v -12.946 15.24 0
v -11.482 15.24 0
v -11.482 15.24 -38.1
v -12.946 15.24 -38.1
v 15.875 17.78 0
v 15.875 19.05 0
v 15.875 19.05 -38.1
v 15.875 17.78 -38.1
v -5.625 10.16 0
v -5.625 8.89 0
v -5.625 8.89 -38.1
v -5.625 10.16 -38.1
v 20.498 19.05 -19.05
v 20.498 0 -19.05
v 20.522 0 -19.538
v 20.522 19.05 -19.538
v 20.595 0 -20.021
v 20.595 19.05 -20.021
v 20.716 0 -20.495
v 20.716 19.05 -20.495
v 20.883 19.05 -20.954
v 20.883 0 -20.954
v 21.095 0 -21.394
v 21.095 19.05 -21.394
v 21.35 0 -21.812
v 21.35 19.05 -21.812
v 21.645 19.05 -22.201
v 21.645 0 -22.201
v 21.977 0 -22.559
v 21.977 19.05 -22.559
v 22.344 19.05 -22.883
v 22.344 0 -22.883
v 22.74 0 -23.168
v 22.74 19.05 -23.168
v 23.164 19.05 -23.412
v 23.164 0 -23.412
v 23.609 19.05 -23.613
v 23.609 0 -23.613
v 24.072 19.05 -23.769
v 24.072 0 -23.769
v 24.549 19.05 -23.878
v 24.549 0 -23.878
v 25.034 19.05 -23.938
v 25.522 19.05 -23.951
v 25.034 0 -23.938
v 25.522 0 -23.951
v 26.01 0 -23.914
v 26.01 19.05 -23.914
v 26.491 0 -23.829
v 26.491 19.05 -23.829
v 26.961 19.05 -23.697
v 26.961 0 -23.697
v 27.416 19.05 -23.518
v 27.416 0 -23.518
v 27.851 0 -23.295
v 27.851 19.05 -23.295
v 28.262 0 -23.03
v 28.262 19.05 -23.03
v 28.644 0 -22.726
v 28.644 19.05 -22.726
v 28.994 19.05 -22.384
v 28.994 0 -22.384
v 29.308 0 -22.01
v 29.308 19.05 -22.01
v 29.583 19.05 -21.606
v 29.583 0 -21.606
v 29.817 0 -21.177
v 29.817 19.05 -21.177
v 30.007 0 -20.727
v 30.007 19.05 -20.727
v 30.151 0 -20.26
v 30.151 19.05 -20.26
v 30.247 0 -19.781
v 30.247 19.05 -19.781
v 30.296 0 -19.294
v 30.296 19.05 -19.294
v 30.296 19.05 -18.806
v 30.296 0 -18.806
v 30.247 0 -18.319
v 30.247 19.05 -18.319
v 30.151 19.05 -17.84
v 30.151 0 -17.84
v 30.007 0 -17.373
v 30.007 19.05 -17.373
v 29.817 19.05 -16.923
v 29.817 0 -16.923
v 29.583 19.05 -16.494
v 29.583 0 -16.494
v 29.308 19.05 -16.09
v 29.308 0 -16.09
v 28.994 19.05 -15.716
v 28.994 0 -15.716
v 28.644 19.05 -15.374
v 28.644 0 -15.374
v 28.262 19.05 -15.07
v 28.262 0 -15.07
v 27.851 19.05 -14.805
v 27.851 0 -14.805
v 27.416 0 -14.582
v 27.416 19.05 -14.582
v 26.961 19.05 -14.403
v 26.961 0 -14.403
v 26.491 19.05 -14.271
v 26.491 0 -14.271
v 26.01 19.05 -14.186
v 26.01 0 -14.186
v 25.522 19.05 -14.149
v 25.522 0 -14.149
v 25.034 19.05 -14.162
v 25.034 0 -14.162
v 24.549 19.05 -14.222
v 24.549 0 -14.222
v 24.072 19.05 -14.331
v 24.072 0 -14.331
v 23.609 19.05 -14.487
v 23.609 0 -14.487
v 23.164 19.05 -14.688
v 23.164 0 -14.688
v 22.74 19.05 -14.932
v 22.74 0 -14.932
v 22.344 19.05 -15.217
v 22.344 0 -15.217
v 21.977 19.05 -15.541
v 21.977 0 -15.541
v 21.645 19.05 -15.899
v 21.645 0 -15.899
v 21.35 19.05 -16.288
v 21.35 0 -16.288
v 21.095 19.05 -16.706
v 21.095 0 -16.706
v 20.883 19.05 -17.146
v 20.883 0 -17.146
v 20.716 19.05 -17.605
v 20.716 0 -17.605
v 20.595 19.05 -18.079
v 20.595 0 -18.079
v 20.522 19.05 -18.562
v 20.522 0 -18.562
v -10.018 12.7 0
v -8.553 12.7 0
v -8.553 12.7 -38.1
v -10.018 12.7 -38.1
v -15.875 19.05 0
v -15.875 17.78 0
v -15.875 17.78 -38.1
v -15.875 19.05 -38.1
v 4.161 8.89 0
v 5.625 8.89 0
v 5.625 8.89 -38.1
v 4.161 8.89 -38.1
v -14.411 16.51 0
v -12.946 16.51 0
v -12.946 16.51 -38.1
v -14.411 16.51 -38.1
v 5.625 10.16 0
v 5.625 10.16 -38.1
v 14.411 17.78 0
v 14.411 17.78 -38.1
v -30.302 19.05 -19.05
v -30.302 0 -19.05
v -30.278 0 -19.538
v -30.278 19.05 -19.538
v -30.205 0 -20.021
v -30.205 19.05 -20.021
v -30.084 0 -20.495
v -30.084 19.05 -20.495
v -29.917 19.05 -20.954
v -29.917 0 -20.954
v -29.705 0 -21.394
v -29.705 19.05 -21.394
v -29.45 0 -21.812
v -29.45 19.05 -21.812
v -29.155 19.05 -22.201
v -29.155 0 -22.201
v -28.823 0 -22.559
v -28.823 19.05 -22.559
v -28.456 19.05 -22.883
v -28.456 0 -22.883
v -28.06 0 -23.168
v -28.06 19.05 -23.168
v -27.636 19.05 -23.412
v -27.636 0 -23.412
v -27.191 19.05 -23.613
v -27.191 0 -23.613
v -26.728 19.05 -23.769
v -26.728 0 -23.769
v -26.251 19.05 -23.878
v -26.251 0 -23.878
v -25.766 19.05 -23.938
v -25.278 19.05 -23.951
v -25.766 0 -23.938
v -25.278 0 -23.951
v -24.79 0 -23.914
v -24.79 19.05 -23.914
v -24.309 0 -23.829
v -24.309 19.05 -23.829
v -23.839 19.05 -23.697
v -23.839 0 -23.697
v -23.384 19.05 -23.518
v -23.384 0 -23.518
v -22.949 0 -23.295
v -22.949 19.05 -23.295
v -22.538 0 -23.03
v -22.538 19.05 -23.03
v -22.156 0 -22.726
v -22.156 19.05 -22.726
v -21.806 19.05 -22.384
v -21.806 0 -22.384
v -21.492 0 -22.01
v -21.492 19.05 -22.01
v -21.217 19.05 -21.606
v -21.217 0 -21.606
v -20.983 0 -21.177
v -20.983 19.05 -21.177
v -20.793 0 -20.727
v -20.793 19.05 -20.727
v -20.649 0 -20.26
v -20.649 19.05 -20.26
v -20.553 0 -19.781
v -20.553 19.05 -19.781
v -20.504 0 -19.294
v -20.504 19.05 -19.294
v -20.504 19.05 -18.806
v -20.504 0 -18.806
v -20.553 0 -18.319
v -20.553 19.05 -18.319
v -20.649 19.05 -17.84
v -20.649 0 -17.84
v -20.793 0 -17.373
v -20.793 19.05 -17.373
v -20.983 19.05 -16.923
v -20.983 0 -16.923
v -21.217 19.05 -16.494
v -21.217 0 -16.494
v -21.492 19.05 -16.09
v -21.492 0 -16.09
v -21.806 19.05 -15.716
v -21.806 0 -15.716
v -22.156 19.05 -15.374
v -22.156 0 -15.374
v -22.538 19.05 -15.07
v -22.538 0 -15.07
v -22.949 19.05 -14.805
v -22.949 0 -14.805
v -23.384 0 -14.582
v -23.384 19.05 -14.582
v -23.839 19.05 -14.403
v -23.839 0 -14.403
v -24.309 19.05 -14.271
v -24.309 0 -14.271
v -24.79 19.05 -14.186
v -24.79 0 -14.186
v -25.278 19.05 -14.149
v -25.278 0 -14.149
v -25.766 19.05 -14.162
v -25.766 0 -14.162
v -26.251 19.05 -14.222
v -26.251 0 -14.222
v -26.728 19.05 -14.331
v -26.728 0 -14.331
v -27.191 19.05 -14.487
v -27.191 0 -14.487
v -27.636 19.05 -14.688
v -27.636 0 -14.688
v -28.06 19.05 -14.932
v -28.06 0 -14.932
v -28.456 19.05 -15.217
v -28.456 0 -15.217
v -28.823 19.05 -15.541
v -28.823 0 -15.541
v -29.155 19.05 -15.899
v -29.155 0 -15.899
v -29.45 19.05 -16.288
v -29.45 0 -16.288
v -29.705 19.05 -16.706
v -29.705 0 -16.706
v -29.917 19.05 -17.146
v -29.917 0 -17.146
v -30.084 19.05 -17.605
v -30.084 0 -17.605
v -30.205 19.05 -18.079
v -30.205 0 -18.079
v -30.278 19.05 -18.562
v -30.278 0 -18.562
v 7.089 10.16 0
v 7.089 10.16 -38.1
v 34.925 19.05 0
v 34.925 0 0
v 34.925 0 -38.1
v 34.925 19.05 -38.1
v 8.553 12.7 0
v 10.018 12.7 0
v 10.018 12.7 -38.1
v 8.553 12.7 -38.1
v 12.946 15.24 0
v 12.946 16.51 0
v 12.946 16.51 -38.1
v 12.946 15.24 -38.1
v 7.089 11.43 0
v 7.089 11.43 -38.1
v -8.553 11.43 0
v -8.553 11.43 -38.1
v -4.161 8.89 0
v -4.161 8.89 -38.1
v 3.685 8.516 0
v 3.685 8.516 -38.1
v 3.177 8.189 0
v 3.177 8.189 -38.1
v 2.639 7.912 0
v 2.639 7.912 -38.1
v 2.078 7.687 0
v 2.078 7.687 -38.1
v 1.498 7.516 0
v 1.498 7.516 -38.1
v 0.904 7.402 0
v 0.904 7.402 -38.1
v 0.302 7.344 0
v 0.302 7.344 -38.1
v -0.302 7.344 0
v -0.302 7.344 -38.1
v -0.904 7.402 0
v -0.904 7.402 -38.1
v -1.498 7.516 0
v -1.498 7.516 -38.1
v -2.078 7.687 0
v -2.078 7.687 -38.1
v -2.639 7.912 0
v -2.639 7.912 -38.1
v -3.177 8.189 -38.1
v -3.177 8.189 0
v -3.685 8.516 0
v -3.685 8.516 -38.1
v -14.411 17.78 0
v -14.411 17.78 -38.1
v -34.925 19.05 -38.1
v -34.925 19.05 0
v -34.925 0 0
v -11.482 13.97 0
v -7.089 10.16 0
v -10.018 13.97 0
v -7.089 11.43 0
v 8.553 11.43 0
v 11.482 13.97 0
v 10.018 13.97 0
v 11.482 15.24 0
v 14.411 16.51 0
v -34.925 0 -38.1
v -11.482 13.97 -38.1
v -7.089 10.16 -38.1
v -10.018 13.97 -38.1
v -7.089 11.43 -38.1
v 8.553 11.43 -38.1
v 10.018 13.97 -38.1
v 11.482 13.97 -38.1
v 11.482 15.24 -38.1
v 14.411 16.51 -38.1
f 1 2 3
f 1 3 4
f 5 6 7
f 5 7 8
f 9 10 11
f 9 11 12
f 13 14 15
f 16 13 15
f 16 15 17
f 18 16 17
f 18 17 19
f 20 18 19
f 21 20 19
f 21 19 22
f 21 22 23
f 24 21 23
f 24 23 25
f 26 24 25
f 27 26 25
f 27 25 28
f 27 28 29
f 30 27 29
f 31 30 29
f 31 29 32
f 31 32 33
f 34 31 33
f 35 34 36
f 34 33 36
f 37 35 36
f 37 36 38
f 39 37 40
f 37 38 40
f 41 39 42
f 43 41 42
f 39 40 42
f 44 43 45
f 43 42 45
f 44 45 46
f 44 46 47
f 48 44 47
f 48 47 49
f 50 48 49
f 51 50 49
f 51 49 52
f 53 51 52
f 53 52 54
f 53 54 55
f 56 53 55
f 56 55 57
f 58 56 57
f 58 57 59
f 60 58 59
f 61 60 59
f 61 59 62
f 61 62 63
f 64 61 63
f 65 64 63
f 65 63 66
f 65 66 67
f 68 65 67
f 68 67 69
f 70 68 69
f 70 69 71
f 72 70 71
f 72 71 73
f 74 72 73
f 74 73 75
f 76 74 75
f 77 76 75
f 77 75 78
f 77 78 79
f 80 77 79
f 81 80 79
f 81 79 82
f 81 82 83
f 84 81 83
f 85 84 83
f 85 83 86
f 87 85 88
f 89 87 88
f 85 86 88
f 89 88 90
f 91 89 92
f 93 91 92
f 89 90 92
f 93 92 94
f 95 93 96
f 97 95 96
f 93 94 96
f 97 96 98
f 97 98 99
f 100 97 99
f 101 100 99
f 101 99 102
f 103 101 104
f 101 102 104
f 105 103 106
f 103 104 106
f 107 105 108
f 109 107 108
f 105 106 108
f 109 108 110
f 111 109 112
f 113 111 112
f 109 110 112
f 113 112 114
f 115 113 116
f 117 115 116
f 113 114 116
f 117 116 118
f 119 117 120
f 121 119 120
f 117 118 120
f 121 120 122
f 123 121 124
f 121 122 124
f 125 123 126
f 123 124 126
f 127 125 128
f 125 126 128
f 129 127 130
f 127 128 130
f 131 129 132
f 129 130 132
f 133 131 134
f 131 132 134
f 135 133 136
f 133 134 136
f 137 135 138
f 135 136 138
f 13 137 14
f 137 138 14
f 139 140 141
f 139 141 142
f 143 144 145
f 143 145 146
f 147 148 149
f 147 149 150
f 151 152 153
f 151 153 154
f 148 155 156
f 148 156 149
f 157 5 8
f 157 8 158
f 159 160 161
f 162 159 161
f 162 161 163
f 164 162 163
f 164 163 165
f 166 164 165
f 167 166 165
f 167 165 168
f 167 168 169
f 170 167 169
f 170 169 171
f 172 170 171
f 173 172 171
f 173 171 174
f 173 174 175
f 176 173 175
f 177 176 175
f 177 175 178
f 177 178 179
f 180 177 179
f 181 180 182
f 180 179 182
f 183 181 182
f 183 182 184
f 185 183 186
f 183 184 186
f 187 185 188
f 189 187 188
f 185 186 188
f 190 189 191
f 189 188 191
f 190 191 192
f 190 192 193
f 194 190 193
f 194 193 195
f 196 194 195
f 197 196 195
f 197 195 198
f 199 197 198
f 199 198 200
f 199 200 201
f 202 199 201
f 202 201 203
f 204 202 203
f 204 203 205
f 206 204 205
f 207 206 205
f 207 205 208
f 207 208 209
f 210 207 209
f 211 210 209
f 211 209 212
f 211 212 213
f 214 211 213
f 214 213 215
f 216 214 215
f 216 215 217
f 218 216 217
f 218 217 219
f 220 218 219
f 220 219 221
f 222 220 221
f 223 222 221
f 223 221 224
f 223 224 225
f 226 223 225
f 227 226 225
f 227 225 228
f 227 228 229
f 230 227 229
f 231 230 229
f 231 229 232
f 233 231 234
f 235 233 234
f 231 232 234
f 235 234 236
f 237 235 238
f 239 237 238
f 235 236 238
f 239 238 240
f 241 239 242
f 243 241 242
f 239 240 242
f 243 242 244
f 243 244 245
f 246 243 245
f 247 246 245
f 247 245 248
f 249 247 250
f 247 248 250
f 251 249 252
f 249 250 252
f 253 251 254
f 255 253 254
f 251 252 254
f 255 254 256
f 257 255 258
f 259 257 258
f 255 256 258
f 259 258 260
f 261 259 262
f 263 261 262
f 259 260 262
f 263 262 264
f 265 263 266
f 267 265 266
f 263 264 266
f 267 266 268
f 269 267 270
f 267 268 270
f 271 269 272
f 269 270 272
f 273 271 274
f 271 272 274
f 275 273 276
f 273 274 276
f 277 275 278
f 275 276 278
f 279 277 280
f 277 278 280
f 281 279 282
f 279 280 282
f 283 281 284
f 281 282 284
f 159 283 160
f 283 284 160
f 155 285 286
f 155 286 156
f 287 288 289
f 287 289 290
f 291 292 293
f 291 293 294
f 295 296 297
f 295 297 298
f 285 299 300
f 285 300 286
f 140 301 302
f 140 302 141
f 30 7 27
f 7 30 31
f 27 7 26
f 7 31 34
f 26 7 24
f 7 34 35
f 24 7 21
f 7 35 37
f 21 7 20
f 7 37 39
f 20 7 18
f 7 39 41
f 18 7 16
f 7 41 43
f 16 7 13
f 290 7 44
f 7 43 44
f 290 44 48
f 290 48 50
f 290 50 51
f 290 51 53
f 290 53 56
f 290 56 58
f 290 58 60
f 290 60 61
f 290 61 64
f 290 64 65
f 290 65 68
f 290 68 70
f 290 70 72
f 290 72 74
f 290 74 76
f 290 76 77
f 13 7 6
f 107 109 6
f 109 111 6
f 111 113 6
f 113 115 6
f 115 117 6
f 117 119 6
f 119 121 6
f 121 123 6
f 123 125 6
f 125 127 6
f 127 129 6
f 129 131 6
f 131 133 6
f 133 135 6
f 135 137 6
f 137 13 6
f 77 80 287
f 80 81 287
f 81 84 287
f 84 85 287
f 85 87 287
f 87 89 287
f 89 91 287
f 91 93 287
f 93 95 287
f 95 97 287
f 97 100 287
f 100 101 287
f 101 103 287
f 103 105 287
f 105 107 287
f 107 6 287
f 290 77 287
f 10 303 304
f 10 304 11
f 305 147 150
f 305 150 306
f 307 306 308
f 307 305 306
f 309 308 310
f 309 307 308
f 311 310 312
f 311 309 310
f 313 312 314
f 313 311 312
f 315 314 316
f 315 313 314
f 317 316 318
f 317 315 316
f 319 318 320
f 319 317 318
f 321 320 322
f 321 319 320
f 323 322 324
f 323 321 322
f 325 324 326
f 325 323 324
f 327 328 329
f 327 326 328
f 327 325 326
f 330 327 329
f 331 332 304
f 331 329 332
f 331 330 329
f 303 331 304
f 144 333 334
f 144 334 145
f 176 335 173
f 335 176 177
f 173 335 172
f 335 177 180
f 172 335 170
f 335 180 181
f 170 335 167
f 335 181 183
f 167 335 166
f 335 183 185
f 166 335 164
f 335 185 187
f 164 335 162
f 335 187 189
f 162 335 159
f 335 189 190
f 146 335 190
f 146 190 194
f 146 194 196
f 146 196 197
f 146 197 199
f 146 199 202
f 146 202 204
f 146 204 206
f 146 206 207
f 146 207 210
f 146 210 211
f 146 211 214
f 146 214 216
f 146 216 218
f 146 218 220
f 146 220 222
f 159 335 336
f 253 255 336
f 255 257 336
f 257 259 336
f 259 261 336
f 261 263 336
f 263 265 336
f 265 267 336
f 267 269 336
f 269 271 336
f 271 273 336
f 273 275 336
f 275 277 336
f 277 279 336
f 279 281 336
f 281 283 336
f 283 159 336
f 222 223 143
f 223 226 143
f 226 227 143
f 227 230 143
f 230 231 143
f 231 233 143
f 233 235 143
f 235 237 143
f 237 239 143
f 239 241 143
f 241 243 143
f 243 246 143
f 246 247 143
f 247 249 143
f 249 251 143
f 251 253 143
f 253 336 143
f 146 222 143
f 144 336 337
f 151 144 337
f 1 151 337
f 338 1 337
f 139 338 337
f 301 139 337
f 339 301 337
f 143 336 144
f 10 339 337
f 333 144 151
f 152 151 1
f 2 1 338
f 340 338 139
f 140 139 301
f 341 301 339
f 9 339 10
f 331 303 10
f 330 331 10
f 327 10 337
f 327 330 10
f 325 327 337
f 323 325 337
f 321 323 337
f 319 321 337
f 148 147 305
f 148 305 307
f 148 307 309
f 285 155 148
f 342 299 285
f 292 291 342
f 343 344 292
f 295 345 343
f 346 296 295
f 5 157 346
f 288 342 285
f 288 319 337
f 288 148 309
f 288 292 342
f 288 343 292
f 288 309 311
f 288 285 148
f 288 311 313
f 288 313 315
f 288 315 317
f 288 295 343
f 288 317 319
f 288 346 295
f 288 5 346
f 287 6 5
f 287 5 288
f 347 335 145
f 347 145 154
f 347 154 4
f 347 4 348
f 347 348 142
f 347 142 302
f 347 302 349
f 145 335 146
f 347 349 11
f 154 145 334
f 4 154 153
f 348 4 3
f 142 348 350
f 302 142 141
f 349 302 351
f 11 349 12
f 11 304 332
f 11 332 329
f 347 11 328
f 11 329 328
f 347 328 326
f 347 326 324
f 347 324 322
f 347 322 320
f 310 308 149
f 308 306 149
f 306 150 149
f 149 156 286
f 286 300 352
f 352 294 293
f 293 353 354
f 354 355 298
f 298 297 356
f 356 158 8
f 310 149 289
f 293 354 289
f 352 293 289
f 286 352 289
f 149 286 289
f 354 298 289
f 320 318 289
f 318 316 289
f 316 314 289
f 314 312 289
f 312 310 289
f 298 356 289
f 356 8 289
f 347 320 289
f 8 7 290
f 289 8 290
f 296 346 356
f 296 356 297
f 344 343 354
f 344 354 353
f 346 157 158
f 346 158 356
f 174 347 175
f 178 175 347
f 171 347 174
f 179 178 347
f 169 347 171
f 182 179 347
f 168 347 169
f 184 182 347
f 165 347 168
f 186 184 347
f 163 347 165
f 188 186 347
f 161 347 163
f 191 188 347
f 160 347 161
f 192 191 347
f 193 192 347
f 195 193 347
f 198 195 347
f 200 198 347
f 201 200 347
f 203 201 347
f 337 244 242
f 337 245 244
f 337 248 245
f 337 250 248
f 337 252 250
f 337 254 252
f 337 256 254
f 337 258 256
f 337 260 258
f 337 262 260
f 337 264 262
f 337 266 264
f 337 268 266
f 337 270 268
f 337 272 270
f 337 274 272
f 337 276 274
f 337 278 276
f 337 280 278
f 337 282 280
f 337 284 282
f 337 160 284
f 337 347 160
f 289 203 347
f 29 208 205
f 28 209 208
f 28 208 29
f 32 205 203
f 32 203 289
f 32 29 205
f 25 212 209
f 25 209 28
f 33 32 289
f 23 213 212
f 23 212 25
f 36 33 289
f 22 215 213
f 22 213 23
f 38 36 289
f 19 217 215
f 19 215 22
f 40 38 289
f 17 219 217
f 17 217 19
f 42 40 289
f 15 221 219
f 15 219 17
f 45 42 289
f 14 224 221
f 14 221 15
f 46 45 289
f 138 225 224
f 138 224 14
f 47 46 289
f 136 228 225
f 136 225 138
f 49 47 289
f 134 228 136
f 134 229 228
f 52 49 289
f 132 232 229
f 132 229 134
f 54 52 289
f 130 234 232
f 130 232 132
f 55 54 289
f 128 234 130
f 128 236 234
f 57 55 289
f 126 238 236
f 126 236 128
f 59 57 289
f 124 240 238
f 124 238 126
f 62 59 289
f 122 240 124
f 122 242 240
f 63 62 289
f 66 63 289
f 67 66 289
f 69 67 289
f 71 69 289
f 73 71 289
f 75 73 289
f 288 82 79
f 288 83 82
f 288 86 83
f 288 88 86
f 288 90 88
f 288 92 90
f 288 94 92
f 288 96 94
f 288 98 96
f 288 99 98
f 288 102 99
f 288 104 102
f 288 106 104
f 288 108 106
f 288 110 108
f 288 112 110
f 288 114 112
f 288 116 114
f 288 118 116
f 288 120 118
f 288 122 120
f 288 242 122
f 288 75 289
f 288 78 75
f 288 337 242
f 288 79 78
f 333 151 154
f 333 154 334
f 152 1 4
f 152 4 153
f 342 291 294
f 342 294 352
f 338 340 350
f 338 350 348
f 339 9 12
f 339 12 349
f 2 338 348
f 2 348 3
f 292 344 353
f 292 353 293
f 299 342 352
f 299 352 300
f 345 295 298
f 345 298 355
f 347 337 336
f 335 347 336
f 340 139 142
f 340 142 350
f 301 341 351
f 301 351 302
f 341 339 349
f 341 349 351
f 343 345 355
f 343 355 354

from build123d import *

# Parameters (mm, degrees)
SKETCH1_W               = 69.85
SKETCH1_H               = 19.05
BOSS_EXTRUDE1_DEPTH     = 38.1
CUT_EXTRUDE1_REACH      = 40.1
F_3_8_CLEARANCE_HOLE1_D = 9.8044


with BuildPart() as part:
    # Sketch1 → Boss-Extrude1 (new body)
    with BuildSketch(Plane.XY):
        with Locations((0, 9.525)):
            Rectangle(SKETCH1_W, SKETCH1_H)
    extrude(amount=-BOSS_EXTRUDE1_DEPTH)

    # Sketch2 → Cut-Extrude1 (cut, up to next)
    with BuildSketch(Plane.XY, mode=Mode.PRIVATE) as cut_extrude1_sk1:
        with BuildLine():
            Line((-15.875, 19.05), (0, 19.05))
            Line((0, 19.05), (15.875, 19.05))
            Line((15.875, 19.05), (15.875, 17.78))
            Line((15.875, 17.78), (14.410694861, 17.78))
            Line((14.410694861, 17.78), (14.410694861, 16.51))
            Line((14.410694861, 16.51), (12.946389723, 16.51))
            Line((12.946389723, 16.51), (12.946389723, 15.24))
            Line((12.946389723, 15.24), (11.482084584, 15.24))
            Line((11.482084584, 15.24), (11.482084584, 13.97))
            Line((11.482084584, 13.97), (10.017779445, 13.97))
            Line((10.017779445, 13.97), (10.017779445, 12.7))
            Line((10.017779445, 12.7), (8.553474306, 12.7))
            Line((8.553474306, 12.7), (8.553474306, 11.43))
            Line((8.553474306, 11.43), (7.089169168, 11.43))
            Line((7.089169168, 11.43), (7.089169168, 10.16))
            Line((7.089169168, 10.16), (5.624864029, 10.16))
            Line((5.624864029, 10.16), (5.624864029, 8.89))
            Line((5.624864029, 8.89), (4.16055889, 8.89))
            ThreePointArc((4.16055889, 8.89), (0, 7.337108475), (-4.16055889, 8.89))
            Line((-4.16055889, 8.89), (-5.624864029, 8.89))
            Line((-5.624864029, 8.89), (-5.624864029, 10.16))
            Line((-5.624864029, 10.16), (-7.089169168, 10.16))
            Line((-7.089169168, 10.16), (-7.089169168, 11.43))
            Line((-7.089169168, 11.43), (-8.553474306, 11.43))
            Line((-8.553474306, 11.43), (-8.553474306, 12.7))
            Line((-8.553474306, 12.7), (-10.017779445, 12.7))
            Line((-10.017779445, 12.7), (-10.017779445, 13.97))
            Line((-10.017779445, 13.97), (-11.482084584, 13.97))
            Line((-11.482084584, 13.97), (-11.482084584, 15.24))
            Line((-11.482084584, 15.24), (-12.946389723, 15.24))
            Line((-12.946389723, 15.24), (-12.946389723, 16.51))
            Line((-12.946389723, 16.51), (-14.410694861, 16.51))
            Line((-14.410694861, 16.51), (-14.410694861, 17.78))
            Line((-14.410694861, 17.78), (-15.875, 17.78))
            Line((-15.875, 17.78), (-15.875, 19.05))
        make_face()
    cut_extrude1_tool1 = extrude(cut_extrude1_sk1.sketch, amount=-CUT_EXTRUDE1_REACH, mode=Mode.PRIVATE) & part.part
    add(cut_extrude1_tool1.solids().sort_by_distance((0, 14.620592, 0))[0], mode=Mode.SUBTRACT)

    # 3/8 Clearance Hole1 (through all)
    with Locations(Plane(origin=(0, 19.05, 0), x_dir=(1, 0, 0), z_dir=(0, 1, 0))):
        with Locations((-25.4, 19.05), (25.4, 19.05)):
            Hole(F_3_8_CLEARANCE_HOLE1_D / 2)


solid = part.part
